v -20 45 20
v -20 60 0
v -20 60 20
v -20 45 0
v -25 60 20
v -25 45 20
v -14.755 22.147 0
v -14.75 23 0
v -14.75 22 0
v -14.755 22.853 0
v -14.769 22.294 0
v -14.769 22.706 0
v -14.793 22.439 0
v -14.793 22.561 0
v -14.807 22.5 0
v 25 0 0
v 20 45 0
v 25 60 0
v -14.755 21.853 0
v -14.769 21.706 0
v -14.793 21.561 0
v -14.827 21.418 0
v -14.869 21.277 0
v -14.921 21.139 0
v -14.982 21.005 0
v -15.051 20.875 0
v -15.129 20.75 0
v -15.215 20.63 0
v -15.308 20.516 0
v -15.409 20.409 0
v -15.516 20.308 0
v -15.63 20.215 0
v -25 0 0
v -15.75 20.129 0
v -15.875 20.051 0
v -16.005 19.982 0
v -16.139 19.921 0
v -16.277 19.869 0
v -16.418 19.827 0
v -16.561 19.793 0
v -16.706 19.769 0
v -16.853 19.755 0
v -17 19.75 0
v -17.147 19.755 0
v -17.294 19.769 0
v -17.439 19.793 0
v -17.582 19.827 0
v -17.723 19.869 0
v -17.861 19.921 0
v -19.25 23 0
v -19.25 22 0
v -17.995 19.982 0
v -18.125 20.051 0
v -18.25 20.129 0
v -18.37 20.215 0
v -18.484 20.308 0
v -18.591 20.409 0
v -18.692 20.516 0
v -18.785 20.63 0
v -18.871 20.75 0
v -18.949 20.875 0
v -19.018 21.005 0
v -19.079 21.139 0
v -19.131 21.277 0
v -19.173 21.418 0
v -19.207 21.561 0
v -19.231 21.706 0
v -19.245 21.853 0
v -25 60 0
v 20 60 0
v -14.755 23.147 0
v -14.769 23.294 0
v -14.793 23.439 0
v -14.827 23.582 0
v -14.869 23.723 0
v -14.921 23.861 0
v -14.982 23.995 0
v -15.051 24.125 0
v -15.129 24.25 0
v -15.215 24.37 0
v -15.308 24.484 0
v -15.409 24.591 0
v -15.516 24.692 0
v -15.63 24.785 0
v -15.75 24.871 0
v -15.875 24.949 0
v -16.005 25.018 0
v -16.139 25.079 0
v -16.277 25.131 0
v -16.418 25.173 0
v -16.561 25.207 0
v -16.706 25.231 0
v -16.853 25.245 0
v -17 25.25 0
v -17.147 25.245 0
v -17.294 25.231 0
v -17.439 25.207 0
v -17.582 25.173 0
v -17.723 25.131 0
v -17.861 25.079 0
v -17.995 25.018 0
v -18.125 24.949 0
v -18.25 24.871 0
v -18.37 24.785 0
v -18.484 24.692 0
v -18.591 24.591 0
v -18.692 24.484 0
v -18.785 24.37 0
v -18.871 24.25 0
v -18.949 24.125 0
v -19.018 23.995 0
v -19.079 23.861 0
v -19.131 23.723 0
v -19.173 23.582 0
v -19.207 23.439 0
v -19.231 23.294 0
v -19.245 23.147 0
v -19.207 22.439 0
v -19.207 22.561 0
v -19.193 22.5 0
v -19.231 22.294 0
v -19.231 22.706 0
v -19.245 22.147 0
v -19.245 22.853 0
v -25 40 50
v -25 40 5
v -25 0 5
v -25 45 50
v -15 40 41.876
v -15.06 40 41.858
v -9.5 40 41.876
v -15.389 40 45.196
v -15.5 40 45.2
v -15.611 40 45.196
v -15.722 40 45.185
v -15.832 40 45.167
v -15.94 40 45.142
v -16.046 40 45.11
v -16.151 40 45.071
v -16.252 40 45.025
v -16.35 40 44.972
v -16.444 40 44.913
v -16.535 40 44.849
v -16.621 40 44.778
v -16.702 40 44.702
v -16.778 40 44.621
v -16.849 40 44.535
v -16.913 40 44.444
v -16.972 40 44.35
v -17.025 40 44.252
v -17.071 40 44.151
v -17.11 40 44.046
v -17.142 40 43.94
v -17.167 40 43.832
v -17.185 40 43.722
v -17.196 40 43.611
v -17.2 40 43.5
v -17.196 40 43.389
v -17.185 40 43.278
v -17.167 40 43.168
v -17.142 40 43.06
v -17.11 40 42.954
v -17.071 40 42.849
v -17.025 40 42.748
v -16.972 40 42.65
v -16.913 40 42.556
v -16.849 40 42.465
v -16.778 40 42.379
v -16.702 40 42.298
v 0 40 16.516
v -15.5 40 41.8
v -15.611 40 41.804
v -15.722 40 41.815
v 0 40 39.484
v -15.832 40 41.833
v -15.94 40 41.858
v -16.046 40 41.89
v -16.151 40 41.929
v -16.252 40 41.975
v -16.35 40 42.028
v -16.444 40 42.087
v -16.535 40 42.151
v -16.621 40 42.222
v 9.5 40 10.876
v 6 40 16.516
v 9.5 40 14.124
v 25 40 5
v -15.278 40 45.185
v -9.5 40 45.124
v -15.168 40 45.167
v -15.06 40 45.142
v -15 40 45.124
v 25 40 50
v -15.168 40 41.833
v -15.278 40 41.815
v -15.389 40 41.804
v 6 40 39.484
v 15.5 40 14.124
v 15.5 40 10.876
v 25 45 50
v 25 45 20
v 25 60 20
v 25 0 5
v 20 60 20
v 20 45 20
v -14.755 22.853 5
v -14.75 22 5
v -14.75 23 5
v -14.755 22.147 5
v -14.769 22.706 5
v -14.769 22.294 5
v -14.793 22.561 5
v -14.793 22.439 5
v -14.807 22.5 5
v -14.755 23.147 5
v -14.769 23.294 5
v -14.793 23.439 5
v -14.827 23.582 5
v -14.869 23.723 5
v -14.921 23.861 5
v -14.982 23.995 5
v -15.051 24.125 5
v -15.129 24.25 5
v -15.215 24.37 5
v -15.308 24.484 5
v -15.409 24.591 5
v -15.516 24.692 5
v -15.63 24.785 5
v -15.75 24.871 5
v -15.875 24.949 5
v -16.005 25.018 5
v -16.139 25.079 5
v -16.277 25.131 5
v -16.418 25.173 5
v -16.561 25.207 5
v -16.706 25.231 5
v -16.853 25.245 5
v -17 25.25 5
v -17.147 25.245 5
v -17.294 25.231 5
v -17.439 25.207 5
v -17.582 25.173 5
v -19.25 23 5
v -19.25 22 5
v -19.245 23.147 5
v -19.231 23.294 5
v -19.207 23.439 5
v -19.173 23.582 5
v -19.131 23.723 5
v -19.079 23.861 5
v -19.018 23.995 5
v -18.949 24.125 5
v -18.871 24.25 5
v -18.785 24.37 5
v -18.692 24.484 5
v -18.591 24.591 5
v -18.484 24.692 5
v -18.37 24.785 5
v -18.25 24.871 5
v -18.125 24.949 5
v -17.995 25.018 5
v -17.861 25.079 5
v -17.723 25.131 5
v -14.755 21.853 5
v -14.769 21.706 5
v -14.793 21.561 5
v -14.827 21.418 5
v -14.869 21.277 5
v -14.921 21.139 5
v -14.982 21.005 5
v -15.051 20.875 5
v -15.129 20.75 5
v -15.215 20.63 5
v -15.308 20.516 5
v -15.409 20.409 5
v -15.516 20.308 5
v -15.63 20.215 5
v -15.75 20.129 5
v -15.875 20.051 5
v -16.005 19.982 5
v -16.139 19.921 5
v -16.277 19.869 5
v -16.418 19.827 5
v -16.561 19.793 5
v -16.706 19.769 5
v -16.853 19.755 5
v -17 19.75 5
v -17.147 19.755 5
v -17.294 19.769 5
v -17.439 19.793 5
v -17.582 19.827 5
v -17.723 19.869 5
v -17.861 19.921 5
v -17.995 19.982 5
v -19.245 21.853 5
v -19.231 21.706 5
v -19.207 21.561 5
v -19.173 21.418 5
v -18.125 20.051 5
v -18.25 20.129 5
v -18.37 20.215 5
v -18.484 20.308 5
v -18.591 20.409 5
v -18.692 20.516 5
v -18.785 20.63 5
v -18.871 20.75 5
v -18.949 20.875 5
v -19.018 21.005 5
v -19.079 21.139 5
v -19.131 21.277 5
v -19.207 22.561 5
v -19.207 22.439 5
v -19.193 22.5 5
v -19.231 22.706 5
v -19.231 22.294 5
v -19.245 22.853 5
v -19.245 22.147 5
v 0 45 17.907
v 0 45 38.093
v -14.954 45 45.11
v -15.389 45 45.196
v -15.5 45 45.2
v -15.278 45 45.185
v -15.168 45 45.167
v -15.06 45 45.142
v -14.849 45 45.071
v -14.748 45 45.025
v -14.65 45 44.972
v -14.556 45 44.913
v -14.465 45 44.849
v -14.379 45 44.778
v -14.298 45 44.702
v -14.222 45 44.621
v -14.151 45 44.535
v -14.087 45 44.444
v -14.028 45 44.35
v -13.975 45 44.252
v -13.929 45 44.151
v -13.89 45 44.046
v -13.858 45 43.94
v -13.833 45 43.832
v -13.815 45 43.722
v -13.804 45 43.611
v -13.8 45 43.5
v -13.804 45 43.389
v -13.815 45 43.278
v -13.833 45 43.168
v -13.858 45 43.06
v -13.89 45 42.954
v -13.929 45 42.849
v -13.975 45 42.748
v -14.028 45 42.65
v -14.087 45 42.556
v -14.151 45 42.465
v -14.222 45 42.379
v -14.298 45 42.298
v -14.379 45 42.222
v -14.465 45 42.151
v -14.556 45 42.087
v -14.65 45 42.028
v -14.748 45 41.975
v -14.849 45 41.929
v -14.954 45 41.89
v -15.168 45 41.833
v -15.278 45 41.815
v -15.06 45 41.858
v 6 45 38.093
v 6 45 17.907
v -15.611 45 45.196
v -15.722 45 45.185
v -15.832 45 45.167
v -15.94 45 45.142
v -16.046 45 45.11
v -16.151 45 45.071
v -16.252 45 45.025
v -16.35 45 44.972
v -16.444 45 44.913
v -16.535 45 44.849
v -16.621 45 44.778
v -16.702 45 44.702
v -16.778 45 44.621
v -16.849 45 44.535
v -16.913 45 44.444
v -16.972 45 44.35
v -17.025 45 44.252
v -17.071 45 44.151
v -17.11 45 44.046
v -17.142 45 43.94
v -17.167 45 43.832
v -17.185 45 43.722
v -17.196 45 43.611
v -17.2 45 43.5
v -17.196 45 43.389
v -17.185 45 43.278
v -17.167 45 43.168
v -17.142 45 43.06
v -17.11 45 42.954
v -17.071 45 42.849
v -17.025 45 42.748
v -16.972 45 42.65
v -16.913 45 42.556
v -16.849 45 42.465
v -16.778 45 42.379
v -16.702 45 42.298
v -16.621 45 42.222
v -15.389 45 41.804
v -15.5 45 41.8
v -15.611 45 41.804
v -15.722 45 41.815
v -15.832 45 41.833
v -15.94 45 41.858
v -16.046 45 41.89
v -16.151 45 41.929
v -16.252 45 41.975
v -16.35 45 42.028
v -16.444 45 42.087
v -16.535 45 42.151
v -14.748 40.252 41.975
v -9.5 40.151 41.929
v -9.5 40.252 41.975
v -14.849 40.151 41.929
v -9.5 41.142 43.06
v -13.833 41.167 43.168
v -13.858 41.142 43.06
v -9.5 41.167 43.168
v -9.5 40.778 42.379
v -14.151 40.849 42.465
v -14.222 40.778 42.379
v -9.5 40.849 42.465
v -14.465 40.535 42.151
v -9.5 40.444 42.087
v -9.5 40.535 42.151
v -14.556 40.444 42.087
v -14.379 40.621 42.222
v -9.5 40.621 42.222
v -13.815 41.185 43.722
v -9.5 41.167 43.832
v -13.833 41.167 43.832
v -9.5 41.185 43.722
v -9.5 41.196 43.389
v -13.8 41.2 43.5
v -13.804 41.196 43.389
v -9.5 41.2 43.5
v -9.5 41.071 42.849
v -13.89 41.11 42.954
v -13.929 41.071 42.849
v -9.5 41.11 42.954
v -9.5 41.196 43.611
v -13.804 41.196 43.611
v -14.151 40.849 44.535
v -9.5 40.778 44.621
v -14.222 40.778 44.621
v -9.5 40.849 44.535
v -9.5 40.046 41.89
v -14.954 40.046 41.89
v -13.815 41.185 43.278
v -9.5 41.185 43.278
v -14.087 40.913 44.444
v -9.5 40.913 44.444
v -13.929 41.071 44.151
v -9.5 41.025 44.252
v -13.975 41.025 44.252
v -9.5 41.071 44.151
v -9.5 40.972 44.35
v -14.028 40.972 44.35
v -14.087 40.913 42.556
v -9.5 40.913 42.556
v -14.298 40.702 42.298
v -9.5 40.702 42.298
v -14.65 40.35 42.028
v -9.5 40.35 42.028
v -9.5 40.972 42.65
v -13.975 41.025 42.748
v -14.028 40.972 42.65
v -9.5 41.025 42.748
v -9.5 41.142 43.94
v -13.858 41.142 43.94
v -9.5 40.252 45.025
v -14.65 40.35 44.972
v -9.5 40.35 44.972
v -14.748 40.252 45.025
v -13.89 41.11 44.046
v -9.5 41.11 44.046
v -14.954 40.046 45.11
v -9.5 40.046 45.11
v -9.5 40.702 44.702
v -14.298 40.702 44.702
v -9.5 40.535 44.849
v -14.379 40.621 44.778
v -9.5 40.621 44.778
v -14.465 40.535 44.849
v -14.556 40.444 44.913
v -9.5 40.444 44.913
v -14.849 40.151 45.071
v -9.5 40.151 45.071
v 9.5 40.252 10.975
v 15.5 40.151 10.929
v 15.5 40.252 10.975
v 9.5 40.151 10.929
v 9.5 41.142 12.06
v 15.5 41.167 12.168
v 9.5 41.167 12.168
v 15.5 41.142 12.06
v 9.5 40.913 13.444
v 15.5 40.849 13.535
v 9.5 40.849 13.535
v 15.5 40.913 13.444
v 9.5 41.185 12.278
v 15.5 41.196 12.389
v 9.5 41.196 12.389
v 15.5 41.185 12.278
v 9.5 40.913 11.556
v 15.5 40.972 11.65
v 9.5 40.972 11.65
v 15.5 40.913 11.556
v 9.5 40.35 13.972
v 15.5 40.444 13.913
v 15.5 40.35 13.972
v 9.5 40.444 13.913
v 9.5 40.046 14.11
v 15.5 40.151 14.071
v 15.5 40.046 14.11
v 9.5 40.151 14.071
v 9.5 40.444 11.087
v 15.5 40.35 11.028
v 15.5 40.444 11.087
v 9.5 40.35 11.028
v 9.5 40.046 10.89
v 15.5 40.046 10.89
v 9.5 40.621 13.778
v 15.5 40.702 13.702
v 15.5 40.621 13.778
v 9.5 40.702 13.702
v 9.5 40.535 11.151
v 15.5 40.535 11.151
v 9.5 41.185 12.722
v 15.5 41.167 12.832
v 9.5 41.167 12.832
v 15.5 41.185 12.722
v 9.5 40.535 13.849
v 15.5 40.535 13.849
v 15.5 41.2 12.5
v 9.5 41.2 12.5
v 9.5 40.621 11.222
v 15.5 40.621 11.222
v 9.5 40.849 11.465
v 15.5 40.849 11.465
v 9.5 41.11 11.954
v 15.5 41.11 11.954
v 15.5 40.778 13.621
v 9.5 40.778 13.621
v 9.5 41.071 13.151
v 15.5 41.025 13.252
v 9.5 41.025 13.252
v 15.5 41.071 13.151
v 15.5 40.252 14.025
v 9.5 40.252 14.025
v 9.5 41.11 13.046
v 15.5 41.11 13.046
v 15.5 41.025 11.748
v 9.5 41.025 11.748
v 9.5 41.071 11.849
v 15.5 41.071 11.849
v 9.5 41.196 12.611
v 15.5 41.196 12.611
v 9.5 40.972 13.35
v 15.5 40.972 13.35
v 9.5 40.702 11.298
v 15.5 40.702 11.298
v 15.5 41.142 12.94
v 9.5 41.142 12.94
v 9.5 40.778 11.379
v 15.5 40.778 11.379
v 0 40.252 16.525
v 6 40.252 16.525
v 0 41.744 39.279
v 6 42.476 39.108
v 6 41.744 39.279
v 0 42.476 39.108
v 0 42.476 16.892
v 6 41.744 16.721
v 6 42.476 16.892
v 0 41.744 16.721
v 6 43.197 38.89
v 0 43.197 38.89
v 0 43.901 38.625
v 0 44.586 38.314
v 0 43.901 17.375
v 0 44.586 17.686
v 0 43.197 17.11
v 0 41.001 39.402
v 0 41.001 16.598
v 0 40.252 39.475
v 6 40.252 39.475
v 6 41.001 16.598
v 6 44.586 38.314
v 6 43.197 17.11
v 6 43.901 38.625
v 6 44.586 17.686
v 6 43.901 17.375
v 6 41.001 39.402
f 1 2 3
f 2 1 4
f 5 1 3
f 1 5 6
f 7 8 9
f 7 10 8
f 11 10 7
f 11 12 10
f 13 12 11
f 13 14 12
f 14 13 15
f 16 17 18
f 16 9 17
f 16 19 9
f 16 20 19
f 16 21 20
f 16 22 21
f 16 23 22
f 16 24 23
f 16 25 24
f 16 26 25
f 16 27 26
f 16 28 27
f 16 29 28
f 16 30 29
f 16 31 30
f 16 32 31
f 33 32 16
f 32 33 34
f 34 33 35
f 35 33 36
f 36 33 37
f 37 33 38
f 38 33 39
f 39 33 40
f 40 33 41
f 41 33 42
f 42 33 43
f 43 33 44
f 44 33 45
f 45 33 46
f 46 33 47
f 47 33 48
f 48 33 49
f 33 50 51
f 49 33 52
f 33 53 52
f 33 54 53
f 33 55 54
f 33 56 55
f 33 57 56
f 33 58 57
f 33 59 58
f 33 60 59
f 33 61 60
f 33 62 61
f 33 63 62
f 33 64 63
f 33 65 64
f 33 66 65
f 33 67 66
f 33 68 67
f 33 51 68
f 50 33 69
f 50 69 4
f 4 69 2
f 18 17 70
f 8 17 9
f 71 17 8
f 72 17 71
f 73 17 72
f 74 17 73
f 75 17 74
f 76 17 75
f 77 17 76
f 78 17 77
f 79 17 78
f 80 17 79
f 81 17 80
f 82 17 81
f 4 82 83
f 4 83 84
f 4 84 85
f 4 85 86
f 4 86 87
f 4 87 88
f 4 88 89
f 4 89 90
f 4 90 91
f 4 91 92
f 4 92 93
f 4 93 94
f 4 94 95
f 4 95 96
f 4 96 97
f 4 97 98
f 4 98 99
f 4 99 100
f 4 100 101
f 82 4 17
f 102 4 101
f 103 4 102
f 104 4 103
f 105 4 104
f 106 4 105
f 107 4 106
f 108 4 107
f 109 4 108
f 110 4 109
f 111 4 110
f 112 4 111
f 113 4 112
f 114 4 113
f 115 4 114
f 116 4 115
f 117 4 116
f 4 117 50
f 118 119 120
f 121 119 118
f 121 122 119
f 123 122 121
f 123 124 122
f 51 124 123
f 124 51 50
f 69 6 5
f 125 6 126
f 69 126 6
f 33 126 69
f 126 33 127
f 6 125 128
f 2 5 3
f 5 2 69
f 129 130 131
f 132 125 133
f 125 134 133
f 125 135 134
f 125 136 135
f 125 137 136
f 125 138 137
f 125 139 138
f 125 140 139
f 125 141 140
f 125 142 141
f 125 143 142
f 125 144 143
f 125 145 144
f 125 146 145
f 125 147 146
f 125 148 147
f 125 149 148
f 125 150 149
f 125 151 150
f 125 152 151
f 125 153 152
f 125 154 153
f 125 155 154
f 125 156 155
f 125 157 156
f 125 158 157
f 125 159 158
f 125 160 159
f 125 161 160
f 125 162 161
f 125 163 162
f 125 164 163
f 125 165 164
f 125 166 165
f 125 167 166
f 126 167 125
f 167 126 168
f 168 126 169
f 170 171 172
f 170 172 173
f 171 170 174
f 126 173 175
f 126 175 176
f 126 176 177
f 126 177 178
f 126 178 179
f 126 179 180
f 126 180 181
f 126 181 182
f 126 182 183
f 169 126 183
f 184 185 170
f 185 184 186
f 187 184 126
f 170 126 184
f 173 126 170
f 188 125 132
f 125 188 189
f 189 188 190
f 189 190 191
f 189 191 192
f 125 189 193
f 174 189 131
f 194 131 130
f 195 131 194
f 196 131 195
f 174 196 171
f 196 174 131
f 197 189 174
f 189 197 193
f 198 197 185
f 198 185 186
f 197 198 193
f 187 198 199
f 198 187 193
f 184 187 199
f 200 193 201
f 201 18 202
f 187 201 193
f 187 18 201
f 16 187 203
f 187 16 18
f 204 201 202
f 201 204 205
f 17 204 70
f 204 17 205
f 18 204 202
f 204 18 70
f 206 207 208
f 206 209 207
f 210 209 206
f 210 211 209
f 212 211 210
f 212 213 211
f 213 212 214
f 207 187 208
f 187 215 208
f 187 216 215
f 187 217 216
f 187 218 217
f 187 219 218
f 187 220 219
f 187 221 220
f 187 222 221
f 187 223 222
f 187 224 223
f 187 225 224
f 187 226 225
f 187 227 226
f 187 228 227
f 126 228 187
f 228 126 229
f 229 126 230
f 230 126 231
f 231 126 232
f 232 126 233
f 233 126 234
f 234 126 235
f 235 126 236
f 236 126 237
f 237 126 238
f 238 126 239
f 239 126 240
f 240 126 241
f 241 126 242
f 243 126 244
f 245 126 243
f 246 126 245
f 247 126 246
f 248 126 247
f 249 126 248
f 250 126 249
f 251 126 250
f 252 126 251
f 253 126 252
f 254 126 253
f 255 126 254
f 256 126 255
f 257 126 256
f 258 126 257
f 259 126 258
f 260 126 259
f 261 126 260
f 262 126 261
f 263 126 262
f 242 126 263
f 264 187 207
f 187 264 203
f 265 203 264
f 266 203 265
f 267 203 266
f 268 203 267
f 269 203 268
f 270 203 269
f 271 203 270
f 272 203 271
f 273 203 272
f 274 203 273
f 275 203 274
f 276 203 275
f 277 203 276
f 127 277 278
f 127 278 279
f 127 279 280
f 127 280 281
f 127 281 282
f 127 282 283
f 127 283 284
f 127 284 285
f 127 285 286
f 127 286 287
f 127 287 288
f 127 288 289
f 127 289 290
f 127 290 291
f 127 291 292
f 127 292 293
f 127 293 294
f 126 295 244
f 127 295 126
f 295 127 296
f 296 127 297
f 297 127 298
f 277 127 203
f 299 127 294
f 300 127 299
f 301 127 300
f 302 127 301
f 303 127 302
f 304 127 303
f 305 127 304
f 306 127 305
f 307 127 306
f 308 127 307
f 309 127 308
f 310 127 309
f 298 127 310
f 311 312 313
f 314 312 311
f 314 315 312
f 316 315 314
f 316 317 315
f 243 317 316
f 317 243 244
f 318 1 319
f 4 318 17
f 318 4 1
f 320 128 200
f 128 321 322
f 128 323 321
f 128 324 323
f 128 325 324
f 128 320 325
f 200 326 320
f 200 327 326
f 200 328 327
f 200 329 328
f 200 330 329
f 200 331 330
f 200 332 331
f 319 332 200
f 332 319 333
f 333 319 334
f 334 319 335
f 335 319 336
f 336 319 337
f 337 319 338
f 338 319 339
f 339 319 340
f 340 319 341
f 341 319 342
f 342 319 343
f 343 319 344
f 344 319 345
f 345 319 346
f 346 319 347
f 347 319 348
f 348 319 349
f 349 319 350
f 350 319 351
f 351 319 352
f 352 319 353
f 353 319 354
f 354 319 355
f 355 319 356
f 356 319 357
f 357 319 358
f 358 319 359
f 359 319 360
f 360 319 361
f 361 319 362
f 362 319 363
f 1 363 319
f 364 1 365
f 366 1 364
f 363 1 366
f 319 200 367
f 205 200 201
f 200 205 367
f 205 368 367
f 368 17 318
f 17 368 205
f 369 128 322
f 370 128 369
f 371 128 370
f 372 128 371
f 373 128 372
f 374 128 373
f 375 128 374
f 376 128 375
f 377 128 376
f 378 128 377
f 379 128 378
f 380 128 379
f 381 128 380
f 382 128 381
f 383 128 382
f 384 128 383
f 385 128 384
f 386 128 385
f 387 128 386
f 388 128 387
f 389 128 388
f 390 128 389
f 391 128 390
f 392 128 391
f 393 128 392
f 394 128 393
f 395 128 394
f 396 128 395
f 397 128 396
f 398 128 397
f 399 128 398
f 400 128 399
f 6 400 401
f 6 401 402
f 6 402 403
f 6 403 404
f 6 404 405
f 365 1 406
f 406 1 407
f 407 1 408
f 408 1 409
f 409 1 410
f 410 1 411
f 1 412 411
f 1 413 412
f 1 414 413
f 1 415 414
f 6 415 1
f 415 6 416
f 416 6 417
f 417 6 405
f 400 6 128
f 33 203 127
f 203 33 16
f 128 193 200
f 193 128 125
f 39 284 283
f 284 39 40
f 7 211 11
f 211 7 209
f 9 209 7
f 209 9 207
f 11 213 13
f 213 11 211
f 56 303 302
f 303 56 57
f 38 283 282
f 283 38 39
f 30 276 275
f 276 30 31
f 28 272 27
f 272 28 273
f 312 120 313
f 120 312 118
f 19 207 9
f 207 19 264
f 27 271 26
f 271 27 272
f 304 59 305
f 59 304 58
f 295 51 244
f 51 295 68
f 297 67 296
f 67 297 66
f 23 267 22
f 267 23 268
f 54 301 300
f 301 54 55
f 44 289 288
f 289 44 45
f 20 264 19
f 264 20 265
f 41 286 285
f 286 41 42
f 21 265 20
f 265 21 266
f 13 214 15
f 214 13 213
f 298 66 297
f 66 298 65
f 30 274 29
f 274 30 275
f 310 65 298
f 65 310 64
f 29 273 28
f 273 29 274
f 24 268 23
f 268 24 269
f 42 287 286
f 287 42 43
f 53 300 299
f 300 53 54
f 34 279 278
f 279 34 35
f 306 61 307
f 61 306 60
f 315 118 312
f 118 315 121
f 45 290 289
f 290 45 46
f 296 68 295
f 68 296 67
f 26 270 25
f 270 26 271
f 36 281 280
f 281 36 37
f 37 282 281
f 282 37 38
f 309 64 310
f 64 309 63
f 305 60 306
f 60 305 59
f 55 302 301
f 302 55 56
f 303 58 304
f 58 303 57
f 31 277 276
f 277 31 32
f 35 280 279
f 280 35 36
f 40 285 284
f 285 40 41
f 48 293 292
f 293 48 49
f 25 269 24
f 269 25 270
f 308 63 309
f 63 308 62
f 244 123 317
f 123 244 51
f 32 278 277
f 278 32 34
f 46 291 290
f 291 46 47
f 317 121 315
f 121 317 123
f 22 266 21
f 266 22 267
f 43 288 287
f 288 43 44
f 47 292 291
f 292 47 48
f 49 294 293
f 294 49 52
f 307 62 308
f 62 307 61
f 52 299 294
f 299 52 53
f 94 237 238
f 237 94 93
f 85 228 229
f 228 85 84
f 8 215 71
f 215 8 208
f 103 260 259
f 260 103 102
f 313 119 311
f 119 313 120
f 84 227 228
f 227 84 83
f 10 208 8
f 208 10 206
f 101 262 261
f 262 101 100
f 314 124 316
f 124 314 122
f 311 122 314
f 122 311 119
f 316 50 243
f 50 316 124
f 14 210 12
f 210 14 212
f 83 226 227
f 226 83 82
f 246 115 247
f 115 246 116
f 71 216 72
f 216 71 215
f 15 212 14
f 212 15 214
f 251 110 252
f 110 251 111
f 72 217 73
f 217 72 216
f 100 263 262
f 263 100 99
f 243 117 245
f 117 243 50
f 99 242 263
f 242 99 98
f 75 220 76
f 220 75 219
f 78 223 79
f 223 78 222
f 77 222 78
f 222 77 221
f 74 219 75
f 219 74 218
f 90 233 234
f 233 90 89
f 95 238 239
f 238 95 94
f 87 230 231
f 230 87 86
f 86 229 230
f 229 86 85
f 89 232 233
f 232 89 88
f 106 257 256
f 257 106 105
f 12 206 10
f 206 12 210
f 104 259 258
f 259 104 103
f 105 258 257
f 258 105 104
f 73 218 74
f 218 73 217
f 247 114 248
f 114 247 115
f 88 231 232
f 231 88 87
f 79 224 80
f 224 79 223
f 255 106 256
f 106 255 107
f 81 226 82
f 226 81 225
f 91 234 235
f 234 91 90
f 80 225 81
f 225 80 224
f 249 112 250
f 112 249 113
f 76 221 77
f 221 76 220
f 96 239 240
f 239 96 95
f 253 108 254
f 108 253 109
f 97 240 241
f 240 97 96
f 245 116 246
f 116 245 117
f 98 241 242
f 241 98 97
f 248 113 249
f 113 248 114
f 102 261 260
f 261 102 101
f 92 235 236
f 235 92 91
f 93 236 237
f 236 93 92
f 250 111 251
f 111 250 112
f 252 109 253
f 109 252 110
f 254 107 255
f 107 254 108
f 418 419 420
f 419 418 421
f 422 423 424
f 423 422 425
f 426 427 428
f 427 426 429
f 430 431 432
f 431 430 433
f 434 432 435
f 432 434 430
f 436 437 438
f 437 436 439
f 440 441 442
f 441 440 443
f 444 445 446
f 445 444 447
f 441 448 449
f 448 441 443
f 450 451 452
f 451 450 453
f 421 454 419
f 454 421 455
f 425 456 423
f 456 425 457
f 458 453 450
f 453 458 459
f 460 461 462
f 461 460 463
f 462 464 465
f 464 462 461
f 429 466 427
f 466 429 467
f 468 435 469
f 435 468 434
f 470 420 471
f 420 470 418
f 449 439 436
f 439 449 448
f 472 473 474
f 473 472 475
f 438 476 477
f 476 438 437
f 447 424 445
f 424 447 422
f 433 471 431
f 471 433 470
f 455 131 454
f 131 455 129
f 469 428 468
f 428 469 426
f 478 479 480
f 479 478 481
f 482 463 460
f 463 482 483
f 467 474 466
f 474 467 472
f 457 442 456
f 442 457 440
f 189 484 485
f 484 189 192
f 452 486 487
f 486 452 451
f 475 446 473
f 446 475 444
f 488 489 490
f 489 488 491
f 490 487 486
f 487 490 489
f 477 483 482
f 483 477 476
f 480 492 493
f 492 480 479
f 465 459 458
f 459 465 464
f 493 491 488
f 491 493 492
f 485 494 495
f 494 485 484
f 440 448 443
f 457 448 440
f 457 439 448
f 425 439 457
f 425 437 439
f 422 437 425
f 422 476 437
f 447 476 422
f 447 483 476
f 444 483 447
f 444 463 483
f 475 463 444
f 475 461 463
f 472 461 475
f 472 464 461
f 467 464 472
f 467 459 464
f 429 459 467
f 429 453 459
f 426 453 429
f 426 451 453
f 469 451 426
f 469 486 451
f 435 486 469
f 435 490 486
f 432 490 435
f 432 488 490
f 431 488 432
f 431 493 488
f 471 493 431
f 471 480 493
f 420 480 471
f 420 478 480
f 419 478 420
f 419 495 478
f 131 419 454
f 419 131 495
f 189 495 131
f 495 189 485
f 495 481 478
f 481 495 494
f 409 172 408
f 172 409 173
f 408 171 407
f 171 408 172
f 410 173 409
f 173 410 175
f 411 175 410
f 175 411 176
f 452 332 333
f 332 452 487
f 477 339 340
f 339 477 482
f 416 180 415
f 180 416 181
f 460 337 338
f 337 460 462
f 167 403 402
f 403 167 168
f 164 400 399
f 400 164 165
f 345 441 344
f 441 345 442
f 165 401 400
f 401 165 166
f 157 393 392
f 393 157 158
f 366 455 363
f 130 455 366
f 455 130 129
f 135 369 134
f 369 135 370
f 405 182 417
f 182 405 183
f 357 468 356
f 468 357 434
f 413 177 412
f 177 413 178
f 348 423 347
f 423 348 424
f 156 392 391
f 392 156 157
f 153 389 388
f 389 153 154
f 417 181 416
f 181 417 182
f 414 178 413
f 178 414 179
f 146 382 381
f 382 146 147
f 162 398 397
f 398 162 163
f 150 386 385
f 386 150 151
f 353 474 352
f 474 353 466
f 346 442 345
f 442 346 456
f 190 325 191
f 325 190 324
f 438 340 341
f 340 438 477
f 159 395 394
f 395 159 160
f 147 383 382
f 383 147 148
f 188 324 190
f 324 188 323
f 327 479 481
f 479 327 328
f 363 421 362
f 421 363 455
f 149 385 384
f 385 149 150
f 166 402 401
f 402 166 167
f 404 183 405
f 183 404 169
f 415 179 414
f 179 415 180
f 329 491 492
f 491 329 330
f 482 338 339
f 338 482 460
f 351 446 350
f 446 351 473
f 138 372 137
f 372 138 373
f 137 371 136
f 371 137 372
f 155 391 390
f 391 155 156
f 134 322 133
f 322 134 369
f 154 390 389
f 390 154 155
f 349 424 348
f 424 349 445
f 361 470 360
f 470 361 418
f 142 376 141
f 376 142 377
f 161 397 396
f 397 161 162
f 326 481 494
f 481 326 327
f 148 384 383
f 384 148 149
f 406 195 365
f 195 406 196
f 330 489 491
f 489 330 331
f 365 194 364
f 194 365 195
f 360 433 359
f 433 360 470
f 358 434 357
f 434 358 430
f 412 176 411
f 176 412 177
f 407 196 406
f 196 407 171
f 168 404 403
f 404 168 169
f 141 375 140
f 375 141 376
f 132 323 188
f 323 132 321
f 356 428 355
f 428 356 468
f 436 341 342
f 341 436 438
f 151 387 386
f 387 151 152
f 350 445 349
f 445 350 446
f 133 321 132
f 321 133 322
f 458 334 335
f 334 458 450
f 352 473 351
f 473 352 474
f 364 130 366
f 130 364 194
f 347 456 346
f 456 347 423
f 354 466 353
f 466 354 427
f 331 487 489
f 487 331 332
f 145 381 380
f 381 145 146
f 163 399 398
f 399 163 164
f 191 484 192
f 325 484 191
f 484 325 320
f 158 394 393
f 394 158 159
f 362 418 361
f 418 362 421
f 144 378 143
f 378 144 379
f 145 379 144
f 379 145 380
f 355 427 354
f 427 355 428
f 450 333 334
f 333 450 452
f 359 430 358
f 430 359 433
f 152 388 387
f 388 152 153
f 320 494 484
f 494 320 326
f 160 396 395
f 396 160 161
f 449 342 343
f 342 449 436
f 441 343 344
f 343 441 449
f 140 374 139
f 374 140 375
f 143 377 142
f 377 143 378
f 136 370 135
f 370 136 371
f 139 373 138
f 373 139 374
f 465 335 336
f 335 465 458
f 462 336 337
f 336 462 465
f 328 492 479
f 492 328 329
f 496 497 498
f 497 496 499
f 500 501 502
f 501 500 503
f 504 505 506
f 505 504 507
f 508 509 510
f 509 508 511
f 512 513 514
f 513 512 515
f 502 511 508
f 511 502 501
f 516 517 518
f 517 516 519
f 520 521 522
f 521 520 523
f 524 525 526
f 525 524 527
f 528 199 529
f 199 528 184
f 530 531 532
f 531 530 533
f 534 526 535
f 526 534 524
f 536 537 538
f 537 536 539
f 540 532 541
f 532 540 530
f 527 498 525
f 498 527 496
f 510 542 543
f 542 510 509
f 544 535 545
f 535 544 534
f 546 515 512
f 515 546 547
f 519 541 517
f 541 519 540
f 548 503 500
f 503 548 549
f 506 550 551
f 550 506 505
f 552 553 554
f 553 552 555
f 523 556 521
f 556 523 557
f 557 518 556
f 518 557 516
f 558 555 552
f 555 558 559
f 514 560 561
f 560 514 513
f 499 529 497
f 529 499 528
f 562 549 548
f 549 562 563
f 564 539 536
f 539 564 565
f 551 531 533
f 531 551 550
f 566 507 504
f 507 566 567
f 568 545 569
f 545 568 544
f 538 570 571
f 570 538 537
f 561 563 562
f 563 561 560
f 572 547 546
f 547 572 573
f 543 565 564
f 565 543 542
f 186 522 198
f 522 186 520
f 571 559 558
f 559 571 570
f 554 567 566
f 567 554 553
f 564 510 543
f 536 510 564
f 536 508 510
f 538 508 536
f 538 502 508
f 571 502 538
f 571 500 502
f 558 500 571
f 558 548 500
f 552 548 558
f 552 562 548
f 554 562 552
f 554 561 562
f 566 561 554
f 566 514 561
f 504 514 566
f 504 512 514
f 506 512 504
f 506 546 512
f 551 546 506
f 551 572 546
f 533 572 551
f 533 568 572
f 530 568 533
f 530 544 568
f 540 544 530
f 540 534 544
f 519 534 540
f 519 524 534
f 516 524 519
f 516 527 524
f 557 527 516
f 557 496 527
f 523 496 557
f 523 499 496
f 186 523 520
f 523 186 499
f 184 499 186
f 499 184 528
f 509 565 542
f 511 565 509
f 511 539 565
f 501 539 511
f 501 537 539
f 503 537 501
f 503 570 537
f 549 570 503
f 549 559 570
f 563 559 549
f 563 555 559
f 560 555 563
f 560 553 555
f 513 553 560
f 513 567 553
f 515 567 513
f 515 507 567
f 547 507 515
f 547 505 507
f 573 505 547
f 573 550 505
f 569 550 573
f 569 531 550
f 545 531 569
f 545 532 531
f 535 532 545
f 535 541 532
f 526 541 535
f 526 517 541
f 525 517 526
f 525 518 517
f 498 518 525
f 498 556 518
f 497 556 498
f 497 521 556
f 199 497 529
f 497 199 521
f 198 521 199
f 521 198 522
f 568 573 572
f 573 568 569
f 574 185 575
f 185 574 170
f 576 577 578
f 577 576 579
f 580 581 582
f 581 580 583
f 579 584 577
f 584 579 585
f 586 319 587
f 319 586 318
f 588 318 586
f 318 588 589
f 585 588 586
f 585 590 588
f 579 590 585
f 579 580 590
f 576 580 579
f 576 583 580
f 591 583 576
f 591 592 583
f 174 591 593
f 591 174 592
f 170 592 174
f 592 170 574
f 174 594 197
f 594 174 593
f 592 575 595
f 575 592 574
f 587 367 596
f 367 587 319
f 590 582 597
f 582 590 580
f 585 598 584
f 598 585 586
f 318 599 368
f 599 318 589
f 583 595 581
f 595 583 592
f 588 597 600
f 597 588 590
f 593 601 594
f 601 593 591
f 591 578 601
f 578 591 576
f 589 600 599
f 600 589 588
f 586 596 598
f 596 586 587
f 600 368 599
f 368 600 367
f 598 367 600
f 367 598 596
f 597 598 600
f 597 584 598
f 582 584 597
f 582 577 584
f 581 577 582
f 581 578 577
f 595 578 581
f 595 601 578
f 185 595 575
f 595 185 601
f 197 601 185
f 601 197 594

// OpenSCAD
// L-shaped mounting bracket for NEMA 17 stepper motor
// Print orientation: base plate flat on bed, motor plate vertical

// ---------- Parameters ----------
base_x      = 25;    // base plate half-width (X)
base_y      = 45;    // base plate length (Y)
base_t      = 5;     // base plate thickness (Z)

motor_h     = 50;    // motor plate height from bed (Z)
motor_w     = 5;     // motor plate thickness (Y)

boss_d      = 23;    // motor boss hole diameter
boss_x      = 0;     // boss hole centre X
boss_z      = 28;    // boss hole centre Z

screw_d     = 3.4;   // M3 screw hole diameter
screw_pitch = 31;    // square pattern side length
screw_n     = 4;     // number of screw holes

gusset_t    = 5;     // gusset thickness (X)
gusset_r    = 20;    // gusset leg along Y
gusset_z    = 20;    // gusset leg along Z

eps         = 0.5;   // cutter overshoot past faces

$fn = 96;

// ---------- Model ----------
difference() {
    union() {
        // Base plate
        translate([-base_x, 0, 0])
            cube([base_x * 2, base_y, base_t]);

        // Motor plate (overlaps base plate for a solid union)
        translate([-base_x, base_y - motor_w, 0])
            cube([base_x * 2, motor_w, motor_h]);

        // Gussets, flush with the outer edges of the base
        for (sx = [-1, 1])
            translate([sx > 0 ? base_x - gusset_t : -base_x,
                       base_y - motor_w,
                       0])
                cube([gusset_t, gusset_r, gusset_z]);
    }

    // Base plate mounting holes
    for (h = [base_y / 2 - eps, base_y / 2 + eps])
        translate([-17, h, -eps])
            cylinder(d = 4.5, h = base_t + 2 * eps);

    // Motor boss hole
    translate([boss_x, base_y - motor_w - eps, boss_z])
        rotate([0, 90, 0])
            cylinder(d = boss_d, h = motor_w + 2 * eps);

    // M3 screw holes on a square pattern centred on the boss
    for (i = [0 : screw_n - 1]) {
        a = i * 90;
        translate([boss_x + (i < 2 ? -1 : 1) * screw_pitch / 2,
                   base_y - motor_w - eps,
                   boss_z + (i >= 2 ? -1 : 1) * screw_pitch / 2])
            rotate([0, 90, a])
                cylinder(d = screw_d, h = motor_w + 2 * eps);
    }
}
